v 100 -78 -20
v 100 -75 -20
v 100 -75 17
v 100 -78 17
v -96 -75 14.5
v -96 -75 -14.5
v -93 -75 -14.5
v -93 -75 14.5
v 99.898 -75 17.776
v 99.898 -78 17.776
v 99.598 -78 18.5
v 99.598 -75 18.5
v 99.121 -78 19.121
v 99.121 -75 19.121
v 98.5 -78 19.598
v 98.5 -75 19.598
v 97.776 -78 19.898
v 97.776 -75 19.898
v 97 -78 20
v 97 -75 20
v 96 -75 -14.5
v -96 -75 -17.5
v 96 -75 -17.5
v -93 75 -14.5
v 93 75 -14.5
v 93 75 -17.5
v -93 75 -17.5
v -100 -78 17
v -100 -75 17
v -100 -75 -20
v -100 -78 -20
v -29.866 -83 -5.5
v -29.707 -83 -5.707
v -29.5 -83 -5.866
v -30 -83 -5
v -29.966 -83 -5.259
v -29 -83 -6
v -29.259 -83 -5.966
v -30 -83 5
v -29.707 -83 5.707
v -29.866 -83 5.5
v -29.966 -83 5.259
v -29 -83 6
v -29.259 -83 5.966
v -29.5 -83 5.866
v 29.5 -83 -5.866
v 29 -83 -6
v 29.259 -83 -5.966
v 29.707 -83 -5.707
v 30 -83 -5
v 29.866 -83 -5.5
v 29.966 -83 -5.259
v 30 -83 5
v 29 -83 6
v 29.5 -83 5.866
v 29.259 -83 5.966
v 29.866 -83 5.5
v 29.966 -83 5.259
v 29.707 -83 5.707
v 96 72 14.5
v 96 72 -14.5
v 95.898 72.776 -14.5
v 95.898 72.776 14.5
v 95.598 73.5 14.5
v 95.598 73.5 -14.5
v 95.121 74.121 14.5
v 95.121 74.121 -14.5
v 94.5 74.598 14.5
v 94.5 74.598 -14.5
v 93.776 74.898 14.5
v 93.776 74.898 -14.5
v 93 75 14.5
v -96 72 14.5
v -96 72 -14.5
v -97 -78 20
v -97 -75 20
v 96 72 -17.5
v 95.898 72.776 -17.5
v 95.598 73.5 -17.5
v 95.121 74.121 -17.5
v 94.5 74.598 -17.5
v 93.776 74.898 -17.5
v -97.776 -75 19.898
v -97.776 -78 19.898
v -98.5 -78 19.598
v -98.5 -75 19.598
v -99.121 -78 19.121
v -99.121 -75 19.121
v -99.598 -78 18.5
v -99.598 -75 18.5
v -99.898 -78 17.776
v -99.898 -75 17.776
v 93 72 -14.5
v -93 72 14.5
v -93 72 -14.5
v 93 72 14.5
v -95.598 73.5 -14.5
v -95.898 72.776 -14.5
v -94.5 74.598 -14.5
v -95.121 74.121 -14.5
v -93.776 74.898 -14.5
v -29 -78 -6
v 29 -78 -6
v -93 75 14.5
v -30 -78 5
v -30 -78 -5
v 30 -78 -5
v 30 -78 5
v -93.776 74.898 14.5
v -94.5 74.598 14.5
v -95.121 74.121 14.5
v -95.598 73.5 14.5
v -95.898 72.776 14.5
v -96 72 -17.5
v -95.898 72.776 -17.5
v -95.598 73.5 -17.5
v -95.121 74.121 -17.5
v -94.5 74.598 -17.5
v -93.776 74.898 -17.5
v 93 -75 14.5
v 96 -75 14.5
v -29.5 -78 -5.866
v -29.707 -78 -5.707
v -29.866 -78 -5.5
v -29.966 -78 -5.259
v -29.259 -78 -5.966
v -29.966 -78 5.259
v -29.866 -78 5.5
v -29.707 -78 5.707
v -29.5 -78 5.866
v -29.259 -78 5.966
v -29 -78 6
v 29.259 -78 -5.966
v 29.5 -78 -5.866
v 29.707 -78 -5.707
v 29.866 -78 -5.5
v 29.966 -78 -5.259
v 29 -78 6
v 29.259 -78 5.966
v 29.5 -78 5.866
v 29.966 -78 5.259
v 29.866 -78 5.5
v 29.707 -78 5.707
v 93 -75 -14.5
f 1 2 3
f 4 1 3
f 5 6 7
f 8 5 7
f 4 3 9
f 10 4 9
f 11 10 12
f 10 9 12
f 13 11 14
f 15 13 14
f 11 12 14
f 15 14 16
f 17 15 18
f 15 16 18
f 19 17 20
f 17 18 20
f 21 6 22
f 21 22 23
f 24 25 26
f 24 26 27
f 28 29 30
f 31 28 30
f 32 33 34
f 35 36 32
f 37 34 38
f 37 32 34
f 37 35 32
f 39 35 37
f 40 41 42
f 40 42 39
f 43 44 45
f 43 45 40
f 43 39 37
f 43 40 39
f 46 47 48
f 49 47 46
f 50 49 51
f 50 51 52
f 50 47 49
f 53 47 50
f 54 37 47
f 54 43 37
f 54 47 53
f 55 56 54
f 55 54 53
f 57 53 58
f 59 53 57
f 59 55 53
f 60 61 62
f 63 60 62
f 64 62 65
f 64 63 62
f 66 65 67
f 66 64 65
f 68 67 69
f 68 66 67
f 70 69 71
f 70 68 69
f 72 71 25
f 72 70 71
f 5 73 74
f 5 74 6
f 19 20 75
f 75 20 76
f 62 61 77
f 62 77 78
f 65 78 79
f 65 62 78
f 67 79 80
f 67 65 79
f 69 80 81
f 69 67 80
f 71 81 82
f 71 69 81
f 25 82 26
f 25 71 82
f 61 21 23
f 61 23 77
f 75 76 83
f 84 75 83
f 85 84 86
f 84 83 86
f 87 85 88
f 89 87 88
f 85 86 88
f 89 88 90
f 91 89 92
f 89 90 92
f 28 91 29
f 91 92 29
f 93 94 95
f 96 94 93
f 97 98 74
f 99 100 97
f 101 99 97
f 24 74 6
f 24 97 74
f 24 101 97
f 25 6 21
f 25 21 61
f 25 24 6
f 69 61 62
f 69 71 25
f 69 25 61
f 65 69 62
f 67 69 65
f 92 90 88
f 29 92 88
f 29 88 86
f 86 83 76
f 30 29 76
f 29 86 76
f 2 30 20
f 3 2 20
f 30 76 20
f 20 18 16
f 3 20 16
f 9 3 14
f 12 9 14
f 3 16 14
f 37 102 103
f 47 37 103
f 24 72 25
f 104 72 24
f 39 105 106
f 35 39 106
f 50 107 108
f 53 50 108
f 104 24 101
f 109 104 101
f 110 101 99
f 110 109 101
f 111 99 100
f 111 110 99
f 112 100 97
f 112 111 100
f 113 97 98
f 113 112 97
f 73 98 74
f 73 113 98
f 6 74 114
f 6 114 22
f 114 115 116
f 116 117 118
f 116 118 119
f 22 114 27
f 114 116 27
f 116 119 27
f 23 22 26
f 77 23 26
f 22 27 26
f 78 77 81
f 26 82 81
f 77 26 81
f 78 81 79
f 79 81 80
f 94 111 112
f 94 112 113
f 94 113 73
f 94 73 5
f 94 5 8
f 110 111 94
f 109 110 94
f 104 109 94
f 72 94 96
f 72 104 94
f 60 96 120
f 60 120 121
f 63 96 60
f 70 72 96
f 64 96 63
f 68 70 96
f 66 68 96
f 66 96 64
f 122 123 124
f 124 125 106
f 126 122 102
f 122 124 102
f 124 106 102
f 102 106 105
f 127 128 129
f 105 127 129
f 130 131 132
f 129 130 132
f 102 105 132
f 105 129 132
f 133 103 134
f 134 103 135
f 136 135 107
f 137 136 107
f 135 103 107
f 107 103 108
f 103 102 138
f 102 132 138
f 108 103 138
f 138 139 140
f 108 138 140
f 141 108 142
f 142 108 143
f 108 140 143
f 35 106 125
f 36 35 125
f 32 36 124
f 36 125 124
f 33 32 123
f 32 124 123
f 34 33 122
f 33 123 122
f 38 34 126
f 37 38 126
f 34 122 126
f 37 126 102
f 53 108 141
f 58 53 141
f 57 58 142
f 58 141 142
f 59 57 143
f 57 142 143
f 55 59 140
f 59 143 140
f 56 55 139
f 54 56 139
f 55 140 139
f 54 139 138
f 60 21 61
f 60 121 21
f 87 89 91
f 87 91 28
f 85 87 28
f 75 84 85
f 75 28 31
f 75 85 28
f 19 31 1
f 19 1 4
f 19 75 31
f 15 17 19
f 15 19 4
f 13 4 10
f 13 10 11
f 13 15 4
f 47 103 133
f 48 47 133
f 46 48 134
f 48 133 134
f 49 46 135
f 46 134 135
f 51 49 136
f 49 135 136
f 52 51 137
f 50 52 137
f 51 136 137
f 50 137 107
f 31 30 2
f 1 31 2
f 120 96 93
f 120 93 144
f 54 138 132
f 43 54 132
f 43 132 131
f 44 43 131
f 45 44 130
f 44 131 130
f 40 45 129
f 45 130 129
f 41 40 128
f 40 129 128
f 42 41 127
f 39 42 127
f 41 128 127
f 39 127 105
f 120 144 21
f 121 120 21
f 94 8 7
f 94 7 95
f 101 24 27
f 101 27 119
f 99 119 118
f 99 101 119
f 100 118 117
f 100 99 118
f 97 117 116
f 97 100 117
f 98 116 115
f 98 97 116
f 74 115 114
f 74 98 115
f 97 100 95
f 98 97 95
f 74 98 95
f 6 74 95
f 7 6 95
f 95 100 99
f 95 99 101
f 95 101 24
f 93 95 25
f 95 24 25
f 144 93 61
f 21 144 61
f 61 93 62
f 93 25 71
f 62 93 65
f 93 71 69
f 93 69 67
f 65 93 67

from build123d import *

# Parameters (mm, degrees)
F1_DEPTH      = 14.5
F1_DEPTH_BACK = 14.5
F4_DEPTH      = 3
F7_DEPTH      = 3
F9_DEPTH      = 5


with BuildPart() as f1:
    # F0 (on Top) → F1 (new body, two sides)
    with BuildSketch(Plane.XY) as f1_sk:
        with BuildLine():
            Line((93, 75), (-93, 75))
            ThreePointArc((-93, 75), (-95.12132, 74.12132), (-96, 72))
            Line((-96, 72), (-96, -75))
            Line((-96, -75), (-93, -75))
            Line((-93, -75), (-93, 72))
            Line((-93, 72), (93, 72))
            Line((93, 72), (93, -75))
            Line((93, -75), (96, -75))
            Line((96, -75), (96, 72))
            ThreePointArc((96, 72), (95.12132, 74.12132), (93, 75))
        make_face()
    extrude(amount=F1_DEPTH)
    extrude(f1_sk.sketch, amount=-F1_DEPTH_BACK)


with BuildPart() as f4:
    # F3 (on offset) → F4 (new body)
    with BuildSketch(Plane.XZ.offset(75)):
        with BuildLine():
            Line((97, 20), (-97, 20))
            ThreePointArc((-97, 20), (-99.12132, 19.12132), (-100, 17))
            Line((-100, 17), (-100, -20))
            Line((-100, -20), (100, -20))
            Line((100, -20), (100, 17))
            ThreePointArc((100, 17), (99.12132, 19.12132), (97, 20))
        make_face()
    extrude(amount=F4_DEPTH)


with BuildPart() as f7:
    # F6 (on offset) → F7 (new body)
    with BuildSketch(Plane.XY.offset(-14.5)):
        with BuildLine():
            ThreePointArc((96, 72), (95.12132, 74.12132), (93, 75))
            Line((93, 75), (-93, 75))
            ThreePointArc((-93, 75), (-95.12132, 74.12132), (-96, 72))
            Line((-96, 72), (-96, -75))
            Line((-96, -75), (96, -75))
            Line((96, -75), (96, 72))
        make_face()
    extrude(amount=-F7_DEPTH)


with BuildPart() as f9:
    # F8 (on face) → F9 (new body)
    with BuildSketch(Plane.XZ.offset(78)):
        with BuildLine():
            ThreePointArc((30, 5), (29.707107, 5.707107), (29, 6))
            Line((29, 6), (-29, 6))
            ThreePointArc((-29, 6), (-29.707107, 5.707107), (-30, 5))
            Line((-30, 5), (-30, -5))
            ThreePointArc((-30, -5), (-29.707107, -5.707107), (-29, -6))
            Line((-29, -6), (29, -6))
            ThreePointArc((29, -6), (29.707107, -5.707107), (30, -5))
            Line((30, -5), (30, 5))
        make_face()
    extrude(amount=F9_DEPTH)


solid = Compound([f1.part, f4.part, f7.part, f9.part])
